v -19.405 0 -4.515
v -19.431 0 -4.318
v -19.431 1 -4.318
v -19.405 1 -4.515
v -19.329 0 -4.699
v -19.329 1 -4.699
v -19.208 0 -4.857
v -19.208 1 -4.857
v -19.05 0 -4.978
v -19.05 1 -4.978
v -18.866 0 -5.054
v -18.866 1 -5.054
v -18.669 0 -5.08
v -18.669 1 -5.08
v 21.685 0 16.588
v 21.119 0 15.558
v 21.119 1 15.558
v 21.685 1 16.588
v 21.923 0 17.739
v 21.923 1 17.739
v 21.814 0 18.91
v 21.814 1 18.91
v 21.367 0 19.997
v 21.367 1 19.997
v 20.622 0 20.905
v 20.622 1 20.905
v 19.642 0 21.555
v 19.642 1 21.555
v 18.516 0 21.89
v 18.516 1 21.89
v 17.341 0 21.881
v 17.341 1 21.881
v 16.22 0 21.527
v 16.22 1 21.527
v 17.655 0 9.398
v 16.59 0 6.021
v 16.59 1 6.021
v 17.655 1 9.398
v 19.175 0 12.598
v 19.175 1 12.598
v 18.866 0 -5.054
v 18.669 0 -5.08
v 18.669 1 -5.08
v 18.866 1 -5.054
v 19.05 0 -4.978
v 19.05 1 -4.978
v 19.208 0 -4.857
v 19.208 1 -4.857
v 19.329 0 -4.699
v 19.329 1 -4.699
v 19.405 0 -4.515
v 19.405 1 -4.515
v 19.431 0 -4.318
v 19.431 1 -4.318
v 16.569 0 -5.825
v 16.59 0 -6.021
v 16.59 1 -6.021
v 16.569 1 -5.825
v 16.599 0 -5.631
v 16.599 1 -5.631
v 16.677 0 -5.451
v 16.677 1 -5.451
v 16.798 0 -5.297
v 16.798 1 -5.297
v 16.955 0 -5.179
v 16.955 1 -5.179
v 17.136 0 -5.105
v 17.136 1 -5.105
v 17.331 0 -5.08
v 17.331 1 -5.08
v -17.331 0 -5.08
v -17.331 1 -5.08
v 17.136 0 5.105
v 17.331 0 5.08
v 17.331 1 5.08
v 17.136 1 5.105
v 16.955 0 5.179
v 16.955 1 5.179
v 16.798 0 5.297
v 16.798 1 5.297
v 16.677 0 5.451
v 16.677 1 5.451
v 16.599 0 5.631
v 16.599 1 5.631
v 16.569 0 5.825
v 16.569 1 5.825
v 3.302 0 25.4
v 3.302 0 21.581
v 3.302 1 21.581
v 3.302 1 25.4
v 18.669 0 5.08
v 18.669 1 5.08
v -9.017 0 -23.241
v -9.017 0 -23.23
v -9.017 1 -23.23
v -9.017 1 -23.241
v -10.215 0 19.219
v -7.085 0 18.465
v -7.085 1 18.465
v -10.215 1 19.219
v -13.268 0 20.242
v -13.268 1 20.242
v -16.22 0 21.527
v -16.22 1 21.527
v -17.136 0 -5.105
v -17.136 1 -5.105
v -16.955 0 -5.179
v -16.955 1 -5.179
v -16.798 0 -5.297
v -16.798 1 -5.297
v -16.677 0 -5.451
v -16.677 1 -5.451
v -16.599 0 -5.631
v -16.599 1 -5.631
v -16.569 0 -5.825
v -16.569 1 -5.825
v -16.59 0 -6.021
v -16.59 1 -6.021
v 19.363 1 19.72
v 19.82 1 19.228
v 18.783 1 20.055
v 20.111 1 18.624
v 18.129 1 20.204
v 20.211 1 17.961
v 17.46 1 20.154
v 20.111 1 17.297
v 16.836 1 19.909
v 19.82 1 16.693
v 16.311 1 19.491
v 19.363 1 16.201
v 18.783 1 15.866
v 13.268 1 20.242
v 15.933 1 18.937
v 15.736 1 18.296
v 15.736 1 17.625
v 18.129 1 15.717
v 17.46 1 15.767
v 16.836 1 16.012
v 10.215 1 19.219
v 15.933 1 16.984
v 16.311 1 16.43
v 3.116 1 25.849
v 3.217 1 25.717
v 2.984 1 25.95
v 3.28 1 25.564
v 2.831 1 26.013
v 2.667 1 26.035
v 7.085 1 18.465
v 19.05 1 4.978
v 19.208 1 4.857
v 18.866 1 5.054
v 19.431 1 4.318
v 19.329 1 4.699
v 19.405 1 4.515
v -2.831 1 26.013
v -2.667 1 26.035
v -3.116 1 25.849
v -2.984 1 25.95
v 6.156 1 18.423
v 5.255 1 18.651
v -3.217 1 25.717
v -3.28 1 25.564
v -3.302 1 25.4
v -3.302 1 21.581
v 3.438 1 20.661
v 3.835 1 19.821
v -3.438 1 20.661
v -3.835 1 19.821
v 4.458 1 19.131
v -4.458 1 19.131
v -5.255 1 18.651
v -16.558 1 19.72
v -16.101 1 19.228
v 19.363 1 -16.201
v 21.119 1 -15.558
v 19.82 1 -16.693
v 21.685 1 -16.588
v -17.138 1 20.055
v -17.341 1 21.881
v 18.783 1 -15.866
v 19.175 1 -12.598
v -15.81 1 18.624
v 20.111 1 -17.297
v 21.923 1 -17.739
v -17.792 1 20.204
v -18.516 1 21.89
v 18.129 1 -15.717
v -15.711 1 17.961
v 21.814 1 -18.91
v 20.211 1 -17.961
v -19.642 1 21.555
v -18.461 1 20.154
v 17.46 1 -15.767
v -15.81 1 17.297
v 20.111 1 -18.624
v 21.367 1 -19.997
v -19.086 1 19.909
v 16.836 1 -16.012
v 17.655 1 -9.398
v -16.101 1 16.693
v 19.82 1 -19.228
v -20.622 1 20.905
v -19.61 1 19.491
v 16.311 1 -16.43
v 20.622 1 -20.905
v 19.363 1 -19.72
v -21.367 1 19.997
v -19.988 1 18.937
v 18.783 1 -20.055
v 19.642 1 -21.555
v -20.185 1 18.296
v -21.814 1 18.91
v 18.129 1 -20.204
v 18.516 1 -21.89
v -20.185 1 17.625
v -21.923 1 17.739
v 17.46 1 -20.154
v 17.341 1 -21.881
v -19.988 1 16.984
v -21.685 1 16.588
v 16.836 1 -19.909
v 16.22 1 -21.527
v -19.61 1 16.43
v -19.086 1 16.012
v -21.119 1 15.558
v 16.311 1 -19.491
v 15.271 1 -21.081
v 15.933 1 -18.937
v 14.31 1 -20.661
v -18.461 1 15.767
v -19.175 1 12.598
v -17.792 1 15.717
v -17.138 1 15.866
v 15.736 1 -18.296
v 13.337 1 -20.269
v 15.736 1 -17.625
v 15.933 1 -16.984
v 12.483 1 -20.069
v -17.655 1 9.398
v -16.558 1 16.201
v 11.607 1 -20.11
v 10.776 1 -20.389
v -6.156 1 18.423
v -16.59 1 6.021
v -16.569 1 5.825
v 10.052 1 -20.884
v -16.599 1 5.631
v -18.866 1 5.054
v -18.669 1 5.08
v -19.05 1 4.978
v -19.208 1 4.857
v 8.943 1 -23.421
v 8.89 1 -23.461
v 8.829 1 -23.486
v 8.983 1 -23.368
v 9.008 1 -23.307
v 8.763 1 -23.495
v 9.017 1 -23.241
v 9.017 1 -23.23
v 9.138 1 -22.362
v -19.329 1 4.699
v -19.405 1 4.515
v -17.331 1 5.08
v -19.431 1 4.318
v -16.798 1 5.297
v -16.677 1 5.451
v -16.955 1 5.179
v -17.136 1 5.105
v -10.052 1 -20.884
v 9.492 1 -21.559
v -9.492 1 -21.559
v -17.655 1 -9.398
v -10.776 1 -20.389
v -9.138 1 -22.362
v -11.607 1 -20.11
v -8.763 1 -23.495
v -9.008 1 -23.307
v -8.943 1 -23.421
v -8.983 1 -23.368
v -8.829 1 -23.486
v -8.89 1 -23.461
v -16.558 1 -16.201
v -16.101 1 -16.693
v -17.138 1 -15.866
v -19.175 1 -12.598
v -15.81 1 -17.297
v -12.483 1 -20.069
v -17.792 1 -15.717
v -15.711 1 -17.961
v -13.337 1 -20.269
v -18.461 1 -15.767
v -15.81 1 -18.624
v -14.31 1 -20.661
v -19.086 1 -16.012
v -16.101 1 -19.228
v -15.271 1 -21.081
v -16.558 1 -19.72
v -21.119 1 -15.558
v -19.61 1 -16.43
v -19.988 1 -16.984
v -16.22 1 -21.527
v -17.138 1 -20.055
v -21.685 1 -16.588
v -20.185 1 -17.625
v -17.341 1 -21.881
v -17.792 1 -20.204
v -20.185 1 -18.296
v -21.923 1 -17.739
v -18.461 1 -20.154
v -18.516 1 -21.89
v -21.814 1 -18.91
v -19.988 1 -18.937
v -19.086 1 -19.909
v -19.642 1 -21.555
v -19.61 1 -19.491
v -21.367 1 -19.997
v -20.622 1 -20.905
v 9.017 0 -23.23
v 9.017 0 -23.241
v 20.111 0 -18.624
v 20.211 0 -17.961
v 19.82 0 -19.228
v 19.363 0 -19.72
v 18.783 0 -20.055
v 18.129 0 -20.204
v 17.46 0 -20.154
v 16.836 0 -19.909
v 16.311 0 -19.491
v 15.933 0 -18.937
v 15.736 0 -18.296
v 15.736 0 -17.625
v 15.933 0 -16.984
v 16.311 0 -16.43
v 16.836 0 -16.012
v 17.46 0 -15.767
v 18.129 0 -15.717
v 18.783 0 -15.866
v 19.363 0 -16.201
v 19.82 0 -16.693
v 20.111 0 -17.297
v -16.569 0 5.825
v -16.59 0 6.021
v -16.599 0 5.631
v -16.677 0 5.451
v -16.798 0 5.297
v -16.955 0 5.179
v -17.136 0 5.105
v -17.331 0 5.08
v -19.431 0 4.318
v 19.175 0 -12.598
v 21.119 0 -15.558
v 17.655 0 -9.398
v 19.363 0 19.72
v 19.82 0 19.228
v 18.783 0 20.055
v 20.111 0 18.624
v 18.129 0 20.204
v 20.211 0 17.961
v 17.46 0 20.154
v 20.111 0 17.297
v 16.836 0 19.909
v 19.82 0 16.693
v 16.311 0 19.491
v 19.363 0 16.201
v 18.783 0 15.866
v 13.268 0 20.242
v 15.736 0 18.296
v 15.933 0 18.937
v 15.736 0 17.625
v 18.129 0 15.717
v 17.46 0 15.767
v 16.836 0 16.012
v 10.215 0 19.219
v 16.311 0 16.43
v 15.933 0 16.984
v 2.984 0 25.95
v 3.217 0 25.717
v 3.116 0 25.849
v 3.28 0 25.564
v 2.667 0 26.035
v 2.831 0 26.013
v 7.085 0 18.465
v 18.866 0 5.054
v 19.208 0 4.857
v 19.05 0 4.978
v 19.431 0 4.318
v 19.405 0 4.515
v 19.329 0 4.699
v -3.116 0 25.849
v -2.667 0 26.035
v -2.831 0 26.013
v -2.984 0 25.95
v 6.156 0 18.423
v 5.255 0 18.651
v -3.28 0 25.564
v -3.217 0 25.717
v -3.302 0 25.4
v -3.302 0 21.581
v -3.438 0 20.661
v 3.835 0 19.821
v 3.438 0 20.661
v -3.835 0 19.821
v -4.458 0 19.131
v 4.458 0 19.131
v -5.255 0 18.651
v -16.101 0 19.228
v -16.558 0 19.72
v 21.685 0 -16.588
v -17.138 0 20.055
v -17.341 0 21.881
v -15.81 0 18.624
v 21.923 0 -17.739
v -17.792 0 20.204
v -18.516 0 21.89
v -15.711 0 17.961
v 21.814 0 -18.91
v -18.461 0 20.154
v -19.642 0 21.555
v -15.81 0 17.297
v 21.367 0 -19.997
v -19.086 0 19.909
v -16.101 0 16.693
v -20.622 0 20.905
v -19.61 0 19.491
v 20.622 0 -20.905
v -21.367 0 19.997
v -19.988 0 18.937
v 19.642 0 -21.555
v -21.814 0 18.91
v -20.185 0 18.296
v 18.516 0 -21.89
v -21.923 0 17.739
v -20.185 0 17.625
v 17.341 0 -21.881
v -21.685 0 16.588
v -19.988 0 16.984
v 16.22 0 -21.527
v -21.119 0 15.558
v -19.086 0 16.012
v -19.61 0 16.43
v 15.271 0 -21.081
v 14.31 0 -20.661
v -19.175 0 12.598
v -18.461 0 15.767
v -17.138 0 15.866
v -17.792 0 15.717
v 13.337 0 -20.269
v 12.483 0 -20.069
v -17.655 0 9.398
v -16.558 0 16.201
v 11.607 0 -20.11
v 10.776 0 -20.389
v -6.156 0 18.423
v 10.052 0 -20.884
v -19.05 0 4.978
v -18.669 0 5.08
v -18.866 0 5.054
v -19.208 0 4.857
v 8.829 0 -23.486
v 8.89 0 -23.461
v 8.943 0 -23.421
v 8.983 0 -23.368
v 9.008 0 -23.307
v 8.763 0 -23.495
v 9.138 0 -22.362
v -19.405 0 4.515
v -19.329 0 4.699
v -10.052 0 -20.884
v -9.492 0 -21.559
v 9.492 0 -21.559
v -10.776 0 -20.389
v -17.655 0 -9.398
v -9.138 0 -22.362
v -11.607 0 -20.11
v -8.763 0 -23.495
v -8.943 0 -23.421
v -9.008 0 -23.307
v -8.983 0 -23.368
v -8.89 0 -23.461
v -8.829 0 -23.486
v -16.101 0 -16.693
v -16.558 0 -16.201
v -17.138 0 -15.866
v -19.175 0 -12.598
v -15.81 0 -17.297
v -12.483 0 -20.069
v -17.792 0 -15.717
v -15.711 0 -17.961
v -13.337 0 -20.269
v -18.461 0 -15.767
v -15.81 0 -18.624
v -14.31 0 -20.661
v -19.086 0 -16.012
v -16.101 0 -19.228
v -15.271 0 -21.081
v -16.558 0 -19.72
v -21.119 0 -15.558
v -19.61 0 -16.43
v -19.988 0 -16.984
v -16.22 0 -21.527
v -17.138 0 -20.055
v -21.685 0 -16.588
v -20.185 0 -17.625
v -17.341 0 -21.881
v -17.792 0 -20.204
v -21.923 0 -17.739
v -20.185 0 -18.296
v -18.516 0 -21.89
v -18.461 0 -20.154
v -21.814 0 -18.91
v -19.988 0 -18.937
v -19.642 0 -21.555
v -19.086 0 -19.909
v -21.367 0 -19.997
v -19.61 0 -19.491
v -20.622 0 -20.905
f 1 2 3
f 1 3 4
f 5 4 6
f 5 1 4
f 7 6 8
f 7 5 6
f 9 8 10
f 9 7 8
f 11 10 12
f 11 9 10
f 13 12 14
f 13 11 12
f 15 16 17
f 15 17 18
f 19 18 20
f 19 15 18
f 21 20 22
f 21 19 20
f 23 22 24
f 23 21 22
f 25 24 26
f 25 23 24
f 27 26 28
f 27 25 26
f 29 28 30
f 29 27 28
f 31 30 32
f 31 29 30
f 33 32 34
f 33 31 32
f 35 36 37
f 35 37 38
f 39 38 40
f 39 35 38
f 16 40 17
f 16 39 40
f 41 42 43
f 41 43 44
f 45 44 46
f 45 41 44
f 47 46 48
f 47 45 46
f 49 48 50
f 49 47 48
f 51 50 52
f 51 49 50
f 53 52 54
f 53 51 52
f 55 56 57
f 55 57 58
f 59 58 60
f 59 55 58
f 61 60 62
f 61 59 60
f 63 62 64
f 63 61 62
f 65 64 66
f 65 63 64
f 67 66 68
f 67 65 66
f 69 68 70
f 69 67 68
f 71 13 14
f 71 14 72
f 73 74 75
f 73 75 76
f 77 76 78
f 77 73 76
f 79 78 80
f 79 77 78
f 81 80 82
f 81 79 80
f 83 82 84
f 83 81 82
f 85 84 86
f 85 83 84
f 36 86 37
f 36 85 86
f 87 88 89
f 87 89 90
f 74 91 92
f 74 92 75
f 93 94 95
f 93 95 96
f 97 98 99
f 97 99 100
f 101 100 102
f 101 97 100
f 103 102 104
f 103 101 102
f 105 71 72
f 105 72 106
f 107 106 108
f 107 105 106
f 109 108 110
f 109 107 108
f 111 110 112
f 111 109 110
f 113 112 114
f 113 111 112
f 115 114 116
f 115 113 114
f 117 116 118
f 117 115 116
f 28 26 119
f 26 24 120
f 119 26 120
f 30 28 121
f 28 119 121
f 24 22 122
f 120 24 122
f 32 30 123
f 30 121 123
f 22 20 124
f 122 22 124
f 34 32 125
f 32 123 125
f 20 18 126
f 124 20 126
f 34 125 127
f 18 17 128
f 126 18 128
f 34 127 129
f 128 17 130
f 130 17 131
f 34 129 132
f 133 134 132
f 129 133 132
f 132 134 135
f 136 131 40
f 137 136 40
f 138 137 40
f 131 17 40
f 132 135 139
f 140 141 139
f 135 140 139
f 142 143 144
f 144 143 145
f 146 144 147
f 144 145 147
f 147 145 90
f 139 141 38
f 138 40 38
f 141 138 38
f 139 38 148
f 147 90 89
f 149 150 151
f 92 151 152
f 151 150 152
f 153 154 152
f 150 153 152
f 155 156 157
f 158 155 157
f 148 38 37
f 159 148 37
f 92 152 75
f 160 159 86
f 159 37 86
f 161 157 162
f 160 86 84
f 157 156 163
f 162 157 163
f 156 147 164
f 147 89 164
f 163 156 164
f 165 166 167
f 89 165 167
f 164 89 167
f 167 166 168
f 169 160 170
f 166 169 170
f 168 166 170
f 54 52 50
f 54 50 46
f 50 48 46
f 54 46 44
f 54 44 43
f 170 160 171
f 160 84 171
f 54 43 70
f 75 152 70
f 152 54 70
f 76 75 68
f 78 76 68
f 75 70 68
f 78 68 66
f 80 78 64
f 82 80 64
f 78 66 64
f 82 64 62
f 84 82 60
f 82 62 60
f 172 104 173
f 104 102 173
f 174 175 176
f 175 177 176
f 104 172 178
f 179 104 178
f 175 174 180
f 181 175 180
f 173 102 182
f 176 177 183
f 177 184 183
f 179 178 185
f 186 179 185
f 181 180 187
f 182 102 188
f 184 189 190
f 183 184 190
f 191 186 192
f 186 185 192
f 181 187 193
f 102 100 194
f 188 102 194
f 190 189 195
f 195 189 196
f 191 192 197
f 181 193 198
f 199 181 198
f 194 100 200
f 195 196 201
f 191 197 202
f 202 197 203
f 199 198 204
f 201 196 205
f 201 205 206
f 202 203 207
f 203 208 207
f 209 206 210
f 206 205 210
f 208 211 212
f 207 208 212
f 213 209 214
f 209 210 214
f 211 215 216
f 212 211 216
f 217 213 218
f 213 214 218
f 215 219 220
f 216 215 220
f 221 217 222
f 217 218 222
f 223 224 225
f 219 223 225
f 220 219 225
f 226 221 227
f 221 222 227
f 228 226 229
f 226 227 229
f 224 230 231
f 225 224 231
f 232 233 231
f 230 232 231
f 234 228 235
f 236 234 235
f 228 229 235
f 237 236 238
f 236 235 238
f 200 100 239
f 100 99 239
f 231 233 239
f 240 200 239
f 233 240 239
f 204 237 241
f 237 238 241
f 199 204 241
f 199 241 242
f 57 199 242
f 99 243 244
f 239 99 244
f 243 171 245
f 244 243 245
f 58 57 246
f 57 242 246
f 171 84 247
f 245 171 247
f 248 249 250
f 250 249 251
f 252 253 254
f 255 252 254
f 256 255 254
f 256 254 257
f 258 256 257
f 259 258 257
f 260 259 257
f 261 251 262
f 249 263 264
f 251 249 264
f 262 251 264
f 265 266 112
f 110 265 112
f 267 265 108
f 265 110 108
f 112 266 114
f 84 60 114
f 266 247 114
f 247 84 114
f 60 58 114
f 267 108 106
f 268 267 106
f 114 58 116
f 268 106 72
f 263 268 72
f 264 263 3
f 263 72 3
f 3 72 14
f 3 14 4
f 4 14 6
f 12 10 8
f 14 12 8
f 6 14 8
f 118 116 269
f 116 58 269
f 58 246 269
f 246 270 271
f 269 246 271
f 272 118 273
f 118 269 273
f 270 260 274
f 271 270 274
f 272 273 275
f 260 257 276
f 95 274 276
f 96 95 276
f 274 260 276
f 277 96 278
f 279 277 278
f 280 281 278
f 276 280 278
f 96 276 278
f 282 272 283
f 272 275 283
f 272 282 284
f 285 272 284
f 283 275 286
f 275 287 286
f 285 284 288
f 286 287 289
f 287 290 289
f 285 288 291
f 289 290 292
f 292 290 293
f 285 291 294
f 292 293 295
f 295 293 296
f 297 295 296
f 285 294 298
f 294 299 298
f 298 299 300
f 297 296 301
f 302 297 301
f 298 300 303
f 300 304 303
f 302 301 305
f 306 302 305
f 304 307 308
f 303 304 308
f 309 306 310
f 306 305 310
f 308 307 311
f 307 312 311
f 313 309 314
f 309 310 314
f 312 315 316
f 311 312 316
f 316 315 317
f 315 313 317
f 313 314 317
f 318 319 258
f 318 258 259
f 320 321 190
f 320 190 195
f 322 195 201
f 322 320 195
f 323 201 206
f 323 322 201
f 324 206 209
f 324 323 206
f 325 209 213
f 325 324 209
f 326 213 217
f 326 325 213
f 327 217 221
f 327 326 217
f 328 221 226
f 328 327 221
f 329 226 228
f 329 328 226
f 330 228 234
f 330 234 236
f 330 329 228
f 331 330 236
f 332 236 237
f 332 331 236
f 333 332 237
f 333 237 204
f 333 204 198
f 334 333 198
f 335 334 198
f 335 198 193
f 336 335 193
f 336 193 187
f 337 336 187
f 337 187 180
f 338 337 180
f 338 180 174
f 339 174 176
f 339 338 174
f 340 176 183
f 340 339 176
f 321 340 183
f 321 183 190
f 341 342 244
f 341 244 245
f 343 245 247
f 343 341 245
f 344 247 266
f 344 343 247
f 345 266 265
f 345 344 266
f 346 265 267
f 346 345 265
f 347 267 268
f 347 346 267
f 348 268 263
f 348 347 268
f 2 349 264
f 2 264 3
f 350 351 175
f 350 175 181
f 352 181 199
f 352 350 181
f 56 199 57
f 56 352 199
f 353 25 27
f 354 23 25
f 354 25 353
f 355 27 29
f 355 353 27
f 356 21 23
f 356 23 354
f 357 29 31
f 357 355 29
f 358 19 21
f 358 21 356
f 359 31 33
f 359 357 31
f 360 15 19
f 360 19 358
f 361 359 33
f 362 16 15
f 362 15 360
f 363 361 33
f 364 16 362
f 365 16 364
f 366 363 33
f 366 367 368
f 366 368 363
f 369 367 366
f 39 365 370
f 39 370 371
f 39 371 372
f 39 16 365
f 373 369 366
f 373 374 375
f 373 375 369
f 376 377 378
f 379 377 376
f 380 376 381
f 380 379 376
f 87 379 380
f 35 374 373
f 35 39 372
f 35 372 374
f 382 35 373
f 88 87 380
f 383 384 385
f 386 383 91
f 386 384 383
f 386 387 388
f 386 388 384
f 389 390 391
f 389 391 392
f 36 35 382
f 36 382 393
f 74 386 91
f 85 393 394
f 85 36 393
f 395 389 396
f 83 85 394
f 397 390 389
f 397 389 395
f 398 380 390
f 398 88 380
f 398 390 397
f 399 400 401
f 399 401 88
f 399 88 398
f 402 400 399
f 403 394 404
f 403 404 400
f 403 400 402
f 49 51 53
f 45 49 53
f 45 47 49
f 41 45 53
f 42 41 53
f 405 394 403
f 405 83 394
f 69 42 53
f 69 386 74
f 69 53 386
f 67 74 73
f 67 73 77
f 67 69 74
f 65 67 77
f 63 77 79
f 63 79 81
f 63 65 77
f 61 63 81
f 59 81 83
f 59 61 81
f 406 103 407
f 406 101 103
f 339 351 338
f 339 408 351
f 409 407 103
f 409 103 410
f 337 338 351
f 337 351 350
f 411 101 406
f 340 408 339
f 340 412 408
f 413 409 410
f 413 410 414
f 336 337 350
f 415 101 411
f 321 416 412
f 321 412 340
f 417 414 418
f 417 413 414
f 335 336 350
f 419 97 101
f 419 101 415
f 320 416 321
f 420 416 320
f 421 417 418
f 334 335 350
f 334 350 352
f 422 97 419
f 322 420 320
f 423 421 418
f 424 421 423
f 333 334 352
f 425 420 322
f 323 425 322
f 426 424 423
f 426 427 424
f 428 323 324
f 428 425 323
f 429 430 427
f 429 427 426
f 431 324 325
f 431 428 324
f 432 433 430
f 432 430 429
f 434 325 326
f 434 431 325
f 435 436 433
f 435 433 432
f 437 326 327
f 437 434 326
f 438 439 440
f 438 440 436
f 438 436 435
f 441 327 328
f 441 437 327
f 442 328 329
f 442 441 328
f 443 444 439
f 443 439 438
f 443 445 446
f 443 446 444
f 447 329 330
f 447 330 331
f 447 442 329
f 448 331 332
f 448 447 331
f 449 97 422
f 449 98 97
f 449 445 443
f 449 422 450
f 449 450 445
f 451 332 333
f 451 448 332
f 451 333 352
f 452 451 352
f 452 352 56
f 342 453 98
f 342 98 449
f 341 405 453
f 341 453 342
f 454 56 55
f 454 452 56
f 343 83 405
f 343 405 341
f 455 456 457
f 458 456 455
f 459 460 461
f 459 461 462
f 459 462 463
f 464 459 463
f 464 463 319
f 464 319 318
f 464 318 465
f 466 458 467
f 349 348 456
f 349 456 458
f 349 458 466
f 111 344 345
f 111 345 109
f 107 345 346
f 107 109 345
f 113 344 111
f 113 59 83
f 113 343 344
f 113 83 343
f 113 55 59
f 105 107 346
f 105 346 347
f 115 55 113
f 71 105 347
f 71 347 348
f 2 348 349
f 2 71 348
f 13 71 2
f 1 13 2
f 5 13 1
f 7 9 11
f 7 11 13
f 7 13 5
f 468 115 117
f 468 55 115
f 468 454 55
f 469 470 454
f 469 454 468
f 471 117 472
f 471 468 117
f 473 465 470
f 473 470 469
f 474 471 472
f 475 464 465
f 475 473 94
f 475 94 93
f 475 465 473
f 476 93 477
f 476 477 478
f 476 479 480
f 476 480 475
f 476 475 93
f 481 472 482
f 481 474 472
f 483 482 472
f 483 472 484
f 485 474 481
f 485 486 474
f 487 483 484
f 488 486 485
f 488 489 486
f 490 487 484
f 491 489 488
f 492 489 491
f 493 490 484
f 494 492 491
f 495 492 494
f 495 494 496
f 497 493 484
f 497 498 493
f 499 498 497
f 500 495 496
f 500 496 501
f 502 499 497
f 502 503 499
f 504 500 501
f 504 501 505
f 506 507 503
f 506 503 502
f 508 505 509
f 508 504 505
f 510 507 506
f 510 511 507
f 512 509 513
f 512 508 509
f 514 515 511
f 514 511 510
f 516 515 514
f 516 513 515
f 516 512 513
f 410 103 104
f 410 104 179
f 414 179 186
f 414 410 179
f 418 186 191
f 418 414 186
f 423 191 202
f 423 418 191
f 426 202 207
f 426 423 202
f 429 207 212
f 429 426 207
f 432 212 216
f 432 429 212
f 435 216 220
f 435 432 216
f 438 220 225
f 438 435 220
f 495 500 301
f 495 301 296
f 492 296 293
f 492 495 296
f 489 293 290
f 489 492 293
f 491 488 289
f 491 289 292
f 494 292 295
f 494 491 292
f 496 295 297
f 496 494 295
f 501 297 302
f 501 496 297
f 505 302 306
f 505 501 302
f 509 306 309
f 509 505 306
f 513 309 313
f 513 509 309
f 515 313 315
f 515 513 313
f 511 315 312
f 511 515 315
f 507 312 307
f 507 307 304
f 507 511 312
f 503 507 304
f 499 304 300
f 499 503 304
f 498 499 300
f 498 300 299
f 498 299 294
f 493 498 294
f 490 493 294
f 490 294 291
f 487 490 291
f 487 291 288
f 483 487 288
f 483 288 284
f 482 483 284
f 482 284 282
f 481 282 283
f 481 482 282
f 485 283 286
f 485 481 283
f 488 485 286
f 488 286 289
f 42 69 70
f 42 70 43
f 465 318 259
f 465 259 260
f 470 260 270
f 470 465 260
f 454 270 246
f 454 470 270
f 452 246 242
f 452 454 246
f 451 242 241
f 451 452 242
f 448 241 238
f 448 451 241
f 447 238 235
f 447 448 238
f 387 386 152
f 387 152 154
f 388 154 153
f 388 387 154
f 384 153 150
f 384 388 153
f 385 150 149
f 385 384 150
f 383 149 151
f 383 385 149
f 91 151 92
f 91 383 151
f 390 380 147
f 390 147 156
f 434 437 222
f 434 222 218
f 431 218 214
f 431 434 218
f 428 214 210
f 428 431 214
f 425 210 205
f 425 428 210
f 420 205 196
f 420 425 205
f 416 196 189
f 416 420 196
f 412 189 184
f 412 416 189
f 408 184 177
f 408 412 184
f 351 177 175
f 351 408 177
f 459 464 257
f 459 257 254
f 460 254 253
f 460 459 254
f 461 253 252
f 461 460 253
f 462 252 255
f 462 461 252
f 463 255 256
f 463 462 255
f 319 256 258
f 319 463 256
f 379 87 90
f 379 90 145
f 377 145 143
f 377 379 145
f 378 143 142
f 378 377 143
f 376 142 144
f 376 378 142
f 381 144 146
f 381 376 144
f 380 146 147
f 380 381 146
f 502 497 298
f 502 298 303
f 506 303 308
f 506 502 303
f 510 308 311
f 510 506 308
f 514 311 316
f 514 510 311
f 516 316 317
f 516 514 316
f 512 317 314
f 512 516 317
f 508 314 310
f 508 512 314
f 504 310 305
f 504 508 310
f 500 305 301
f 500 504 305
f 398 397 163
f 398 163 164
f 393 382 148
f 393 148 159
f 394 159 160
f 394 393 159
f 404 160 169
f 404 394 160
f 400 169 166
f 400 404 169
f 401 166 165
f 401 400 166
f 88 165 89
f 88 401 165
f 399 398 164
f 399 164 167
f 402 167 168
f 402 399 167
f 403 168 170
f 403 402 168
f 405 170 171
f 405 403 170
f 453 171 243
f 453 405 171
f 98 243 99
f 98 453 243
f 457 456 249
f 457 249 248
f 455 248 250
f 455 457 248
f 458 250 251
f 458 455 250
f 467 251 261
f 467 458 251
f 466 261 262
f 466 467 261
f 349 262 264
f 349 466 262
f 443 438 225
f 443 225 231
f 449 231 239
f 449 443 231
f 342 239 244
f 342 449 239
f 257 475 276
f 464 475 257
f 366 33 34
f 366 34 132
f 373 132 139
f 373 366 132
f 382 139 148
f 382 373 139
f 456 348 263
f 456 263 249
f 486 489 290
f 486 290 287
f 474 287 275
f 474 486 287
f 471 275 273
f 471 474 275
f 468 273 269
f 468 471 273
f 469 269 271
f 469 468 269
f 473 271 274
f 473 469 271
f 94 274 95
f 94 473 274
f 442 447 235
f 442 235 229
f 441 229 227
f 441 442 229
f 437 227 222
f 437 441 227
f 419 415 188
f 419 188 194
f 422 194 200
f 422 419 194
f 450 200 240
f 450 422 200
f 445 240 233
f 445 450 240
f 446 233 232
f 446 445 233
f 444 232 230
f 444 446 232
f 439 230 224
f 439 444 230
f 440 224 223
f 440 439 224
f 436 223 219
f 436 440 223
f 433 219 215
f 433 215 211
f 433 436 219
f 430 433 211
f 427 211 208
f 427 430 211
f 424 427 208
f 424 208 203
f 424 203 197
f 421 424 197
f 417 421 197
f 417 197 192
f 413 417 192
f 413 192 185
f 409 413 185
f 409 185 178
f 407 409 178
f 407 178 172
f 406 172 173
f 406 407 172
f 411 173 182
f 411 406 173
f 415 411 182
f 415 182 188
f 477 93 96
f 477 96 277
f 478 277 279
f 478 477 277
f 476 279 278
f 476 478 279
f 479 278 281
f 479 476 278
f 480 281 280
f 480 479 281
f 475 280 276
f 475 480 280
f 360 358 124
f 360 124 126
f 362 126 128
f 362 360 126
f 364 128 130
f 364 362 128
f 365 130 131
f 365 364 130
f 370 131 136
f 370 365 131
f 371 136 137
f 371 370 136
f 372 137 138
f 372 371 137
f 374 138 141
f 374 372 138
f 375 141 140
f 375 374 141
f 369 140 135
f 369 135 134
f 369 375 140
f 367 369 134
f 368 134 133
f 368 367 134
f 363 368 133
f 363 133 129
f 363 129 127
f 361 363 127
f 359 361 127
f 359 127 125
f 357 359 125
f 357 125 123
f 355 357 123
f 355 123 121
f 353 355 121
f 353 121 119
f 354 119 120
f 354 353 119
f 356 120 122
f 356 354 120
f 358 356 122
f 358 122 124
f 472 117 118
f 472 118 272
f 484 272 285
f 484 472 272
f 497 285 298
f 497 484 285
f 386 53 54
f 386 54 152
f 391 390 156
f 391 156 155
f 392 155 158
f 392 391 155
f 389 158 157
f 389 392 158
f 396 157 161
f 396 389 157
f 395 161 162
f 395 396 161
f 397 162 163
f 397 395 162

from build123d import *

# Parameters (mm, degrees)
SKETCH1_R           = 2.25
BOSS_EXTRUDE2_DEPTH = 1


with BuildPart() as part:
    # Sketch1 → Boss-Extrude2 (new body)
    with BuildSketch(Plane(origin=(0, 0, 0), x_dir=(1, 0, 0), z_dir=(0, 1, 0))):
        with BuildLine():
            Line((-17.330956316, -5.08), (-18.669, -5.08))
            ThreePointArc((-18.669, -5.08), (-19.207815367, -4.856815367), (-19.431, -4.318))
            Line((-19.431, -4.318), (-19.431, 4.318))
            ThreePointArc((-19.431, 4.318), (-19.207815367, 4.856815367), (-18.669, 5.08))
            Line((-18.669, 5.08), (-17.330956316, 5.08))
            ThreePointArc((-17.330956316, 5.08), (-16.732344988, 5.370503999), (-16.590161442, 6.020513179))
            ThreePointArc((-16.590161442, 6.020513179), (-18.359695736, 11.0243031), (-21.119367367, 15.557886415))
            ThreePointArc((-21.119367367, 15.557886415), (-21.028176895, 20.478529347), (-16.219689319, 21.527094936))
            ThreePointArc((-16.219689319, 21.527094936), (-14.791805557, 20.867380989), (-13.337157819, 20.268987731))
            ThreePointArc((-13.337157819, 20.268987731), (-10.39690266, 20.611451573), (-9.017, 23.230277748))
            Line((-9.017, 23.230277748), (-9.017, 23.241))
            ThreePointArc((-9.017, 23.241), (-8.942605122, 23.420605122), (-8.763, 23.495))
            Line((-8.763, 23.495), (8.763, 23.495))
            ThreePointArc((8.763, 23.495), (8.942605122, 23.420605122), (9.017, 23.241))
            Line((9.017, 23.241), (9.017, 23.230277748))
            ThreePointArc((9.017, 23.230277748), (10.39690266, 20.611451573), (13.337157819, 20.268987731))
            ThreePointArc((13.337157819, 20.268987731), (14.791805557, 20.867380989), (16.219689319, 21.527094936))
            ThreePointArc((16.219689319, 21.527094936), (21.028176895, 20.478529347), (21.119367367, 15.557886415))
            ThreePointArc((21.119367367, 15.557886415), (18.359695736, 11.0243031), (16.590161442, 6.020513179))
            ThreePointArc((16.590161442, 6.020513179), (16.732344988, 5.370503999), (17.330956316, 5.08))
            Line((17.330956316, 5.08), (18.669, 5.08))
            ThreePointArc((18.669, 5.08), (19.207815367, 4.856815367), (19.431, 4.318))
            Line((19.431, 4.318), (19.431, -4.318))
            ThreePointArc((19.431, -4.318), (19.207815367, -4.856815367), (18.669, -5.08))
            Line((18.669, -5.08), (17.330956316, -5.08))
            ThreePointArc((17.330956316, -5.08), (16.732344988, -5.370503999), (16.590161442, -6.020513179))
            ThreePointArc((16.590161442, -6.020513179), (18.359695736, -11.0243031), (21.119367367, -15.557886415))
            ThreePointArc((21.119367367, -15.557886415), (21.028176895, -20.478529347), (16.219689319, -21.527094936))
            ThreePointArc((16.219689319, -21.527094936), (11.752669663, -19.697385754), (7.085365092, -18.465164862))
            ThreePointArc((7.085365092, -18.465164862), (4.458452771, -19.130602125), (3.302, -21.581335094))
            Line((3.302, -21.581335094), (3.302, -25.4))
            ThreePointArc((3.302, -25.4), (3.116012806, -25.849012806), (2.667, -26.035))
            Line((2.667, -26.035), (-2.667, -26.035))
            ThreePointArc((-2.667, -26.035), (-3.116012806, -25.849012806), (-3.302, -25.4))
            Line((-3.302, -25.4), (-3.302, -21.581335094))
            ThreePointArc((-3.302, -21.581335094), (-4.458452771, -19.130602125), (-7.085365092, -18.465164862))
            ThreePointArc((-7.085365092, -18.465164862), (-11.752669663, -19.697385754), (-16.219689319, -21.527094936))
            ThreePointArc((-16.219689319, -21.527094936), (-21.028176895, -20.478529347), (-21.119367367, -15.557886415))
            ThreePointArc((-21.119367367, -15.557886415), (-18.359695736, -11.0243031), (-16.590161442, -6.020513179))
            ThreePointArc((-16.590161442, -6.020513179), (-16.732344988, -5.370503999), (-17.330956316, -5.08))
        make_face()
        with Locations((-17.960512242, -17.960512242)):
            Circle(SKETCH1_R, mode=Mode.SUBTRACT)
        with Locations((17.960512242, -17.960512242)):
            Circle(SKETCH1_R, mode=Mode.SUBTRACT)
        with Locations((17.960512242, 17.960512242)):
            Circle(SKETCH1_R, mode=Mode.SUBTRACT)
        with Locations((-17.960512242, 17.960512242)):
            Circle(SKETCH1_R, mode=Mode.SUBTRACT)
    extrude(amount=BOSS_EXTRUDE2_DEPTH)


solid = part.part
